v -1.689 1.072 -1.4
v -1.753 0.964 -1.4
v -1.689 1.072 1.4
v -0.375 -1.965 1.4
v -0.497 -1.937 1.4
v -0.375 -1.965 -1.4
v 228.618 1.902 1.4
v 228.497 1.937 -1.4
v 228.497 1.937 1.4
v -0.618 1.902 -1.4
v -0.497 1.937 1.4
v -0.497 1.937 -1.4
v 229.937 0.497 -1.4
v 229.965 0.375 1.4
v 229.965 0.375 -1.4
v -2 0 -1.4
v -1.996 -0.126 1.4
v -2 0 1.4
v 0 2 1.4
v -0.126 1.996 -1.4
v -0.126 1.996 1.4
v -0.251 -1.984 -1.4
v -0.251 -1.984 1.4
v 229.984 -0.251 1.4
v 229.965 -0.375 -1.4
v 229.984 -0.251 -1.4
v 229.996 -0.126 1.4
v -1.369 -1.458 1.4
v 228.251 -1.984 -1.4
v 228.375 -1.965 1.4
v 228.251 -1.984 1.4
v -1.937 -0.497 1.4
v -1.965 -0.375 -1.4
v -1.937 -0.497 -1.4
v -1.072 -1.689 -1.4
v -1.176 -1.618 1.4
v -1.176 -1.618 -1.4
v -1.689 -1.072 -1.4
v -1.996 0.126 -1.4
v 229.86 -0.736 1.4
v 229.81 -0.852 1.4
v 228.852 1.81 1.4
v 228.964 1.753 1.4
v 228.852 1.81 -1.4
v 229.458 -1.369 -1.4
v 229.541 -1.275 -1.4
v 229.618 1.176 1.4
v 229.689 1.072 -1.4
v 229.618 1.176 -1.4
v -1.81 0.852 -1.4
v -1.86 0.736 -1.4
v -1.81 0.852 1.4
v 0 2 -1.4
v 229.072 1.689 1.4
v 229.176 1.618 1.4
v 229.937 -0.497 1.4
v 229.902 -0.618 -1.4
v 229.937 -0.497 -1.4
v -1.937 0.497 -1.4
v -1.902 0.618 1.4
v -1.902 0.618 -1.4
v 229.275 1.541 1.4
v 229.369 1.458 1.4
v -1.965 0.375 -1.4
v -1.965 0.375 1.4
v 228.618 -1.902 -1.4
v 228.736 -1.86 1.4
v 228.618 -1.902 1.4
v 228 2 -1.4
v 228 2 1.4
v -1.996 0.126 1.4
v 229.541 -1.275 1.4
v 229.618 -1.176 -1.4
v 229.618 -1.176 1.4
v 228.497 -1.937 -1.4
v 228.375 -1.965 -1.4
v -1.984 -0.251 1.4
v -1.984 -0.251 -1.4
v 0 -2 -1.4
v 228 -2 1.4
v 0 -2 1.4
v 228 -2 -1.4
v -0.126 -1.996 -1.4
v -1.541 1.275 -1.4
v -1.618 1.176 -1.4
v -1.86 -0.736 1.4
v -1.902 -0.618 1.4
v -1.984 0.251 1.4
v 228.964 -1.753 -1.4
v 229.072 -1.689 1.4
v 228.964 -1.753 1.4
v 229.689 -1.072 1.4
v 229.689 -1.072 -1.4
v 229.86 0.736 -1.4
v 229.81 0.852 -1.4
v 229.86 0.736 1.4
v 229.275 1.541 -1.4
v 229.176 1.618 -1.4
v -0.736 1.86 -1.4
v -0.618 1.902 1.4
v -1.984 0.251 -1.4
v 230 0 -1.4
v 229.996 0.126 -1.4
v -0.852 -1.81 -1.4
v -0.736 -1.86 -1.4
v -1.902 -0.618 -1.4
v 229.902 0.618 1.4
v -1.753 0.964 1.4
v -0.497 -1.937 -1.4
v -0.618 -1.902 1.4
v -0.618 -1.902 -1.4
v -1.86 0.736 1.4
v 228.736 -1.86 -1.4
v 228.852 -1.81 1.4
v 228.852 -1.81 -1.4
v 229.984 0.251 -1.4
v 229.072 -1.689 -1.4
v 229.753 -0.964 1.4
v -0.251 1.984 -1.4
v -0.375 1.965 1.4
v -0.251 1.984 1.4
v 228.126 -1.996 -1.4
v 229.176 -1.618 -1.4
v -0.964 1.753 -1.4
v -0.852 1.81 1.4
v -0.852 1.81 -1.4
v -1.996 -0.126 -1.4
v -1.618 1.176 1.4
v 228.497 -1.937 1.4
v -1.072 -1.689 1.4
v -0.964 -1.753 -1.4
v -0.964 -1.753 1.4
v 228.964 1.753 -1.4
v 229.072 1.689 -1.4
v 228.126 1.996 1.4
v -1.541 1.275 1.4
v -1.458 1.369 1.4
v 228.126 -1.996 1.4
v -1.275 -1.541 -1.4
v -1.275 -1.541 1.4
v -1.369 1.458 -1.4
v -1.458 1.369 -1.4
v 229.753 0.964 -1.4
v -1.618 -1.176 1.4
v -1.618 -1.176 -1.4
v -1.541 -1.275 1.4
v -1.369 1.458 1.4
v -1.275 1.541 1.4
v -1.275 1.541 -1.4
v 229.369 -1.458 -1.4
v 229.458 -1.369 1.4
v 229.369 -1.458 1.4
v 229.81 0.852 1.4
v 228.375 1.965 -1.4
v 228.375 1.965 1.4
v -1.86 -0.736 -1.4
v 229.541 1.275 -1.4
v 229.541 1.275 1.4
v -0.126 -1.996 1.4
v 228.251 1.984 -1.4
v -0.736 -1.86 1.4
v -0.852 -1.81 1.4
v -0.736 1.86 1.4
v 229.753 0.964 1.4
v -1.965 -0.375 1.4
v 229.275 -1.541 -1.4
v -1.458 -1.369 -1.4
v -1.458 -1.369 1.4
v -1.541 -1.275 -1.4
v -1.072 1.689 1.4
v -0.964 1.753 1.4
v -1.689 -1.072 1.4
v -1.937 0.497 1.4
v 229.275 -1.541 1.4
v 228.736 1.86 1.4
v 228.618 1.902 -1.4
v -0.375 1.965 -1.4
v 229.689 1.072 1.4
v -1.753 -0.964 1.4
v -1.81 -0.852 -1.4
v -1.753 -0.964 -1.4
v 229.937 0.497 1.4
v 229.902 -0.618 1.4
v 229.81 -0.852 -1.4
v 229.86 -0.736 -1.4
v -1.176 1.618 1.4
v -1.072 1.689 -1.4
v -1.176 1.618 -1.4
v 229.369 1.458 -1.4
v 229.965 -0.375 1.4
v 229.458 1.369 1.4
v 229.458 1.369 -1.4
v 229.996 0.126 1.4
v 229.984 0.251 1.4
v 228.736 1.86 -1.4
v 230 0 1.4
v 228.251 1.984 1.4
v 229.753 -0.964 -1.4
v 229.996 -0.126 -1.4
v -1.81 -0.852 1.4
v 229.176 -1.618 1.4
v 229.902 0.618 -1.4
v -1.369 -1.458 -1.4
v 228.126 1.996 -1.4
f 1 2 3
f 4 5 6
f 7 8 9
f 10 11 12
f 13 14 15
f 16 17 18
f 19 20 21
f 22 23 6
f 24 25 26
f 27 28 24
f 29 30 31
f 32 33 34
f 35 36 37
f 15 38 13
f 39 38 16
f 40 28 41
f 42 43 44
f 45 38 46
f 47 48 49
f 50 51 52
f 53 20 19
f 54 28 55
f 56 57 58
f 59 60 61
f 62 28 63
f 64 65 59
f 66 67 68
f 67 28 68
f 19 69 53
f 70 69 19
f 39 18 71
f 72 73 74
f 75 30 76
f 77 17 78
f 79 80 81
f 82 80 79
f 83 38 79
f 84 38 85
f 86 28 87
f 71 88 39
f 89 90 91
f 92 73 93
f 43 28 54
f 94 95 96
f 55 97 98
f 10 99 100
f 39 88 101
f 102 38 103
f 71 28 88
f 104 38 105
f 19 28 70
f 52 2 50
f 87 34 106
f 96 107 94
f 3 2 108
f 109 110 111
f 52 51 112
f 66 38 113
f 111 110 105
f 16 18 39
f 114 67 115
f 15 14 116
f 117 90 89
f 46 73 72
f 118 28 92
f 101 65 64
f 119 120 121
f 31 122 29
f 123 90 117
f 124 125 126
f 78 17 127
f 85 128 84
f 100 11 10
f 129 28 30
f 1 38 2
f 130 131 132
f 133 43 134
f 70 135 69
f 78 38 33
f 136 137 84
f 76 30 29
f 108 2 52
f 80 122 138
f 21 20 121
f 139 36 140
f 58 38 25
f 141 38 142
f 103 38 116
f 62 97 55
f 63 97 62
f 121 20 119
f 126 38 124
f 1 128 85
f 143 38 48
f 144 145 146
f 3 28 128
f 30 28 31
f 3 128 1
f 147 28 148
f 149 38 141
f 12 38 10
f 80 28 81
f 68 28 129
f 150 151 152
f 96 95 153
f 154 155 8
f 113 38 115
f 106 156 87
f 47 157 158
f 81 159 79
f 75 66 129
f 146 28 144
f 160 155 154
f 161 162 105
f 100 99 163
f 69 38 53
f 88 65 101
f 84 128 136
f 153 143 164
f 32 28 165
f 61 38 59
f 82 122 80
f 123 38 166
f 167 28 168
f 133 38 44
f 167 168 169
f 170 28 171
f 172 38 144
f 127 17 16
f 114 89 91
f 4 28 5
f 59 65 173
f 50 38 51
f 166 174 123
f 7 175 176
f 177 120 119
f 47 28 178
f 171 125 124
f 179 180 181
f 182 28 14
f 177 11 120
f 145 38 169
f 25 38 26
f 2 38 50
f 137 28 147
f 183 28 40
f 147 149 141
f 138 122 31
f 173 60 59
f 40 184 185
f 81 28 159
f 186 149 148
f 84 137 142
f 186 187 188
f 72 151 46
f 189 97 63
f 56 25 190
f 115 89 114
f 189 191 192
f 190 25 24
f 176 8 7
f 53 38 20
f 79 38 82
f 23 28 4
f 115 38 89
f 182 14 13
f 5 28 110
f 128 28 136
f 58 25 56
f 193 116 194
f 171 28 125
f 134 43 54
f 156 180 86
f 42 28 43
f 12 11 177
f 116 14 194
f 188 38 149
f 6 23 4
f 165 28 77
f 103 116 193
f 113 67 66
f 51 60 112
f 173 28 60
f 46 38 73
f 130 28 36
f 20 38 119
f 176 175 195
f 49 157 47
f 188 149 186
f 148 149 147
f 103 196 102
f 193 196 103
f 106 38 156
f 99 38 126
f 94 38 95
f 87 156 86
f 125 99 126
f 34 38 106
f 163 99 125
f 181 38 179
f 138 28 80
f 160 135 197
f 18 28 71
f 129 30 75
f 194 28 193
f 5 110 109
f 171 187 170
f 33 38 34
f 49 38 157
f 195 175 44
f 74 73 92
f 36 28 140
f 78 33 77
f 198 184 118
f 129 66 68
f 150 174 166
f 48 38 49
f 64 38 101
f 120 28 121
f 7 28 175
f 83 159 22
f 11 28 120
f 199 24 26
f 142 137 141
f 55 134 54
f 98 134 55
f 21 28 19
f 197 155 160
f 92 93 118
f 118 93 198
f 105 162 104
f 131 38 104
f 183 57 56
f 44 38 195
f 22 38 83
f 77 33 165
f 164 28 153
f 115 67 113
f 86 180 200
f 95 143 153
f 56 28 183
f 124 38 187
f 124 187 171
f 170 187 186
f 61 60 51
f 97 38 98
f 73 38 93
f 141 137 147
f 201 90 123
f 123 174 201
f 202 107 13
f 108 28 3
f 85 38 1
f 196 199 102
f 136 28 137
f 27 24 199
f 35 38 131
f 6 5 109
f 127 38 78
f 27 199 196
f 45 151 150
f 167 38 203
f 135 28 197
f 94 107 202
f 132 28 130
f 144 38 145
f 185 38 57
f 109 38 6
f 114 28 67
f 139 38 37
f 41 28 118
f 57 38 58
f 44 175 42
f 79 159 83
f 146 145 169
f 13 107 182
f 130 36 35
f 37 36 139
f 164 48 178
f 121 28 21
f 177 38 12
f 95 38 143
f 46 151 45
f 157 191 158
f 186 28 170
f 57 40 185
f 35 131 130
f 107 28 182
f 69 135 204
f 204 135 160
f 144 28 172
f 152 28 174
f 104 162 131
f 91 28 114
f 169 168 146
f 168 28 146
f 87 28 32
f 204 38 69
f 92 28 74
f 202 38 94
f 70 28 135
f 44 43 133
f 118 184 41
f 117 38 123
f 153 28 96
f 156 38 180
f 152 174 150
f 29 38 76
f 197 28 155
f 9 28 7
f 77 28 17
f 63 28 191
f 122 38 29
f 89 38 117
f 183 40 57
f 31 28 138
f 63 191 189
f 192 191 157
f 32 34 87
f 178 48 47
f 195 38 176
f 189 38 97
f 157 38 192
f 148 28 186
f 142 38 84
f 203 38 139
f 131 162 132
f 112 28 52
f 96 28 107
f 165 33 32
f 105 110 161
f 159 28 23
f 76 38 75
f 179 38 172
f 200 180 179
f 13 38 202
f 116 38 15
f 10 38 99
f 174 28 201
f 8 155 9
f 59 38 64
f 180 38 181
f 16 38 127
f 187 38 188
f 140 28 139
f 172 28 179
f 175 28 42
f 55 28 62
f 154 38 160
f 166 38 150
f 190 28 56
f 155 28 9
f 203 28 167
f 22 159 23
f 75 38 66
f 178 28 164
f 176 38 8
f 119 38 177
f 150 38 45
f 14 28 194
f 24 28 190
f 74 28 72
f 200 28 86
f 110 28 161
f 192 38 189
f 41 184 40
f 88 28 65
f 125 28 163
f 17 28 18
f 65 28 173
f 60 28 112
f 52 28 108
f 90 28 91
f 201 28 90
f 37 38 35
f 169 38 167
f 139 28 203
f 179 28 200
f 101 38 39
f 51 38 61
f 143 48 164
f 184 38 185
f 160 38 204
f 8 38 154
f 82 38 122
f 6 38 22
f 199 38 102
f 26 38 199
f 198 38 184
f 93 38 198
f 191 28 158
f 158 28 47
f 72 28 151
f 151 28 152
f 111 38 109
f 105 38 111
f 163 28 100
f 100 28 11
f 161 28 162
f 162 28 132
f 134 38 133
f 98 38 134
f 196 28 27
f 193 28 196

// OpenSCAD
innerDiameter = 2;
outerDiameter = 2;
width = 2.8;
resolution = 100;
length = 228;

difference(){
    
    hull(){
        linear_extrude(height = width, center = true, convexity = 10, twist = 0, $fn = resolution){
            circle(outerDiameter, $fn = resolution);
        }
        

        linear_extrude(height = width, center = true, convexity = 10, twist = 0, $fn = resolution){
            translate([length,0,0])
                circle(outerDiameter, $fn = resolution);
        }
    }
    

}
    
    
